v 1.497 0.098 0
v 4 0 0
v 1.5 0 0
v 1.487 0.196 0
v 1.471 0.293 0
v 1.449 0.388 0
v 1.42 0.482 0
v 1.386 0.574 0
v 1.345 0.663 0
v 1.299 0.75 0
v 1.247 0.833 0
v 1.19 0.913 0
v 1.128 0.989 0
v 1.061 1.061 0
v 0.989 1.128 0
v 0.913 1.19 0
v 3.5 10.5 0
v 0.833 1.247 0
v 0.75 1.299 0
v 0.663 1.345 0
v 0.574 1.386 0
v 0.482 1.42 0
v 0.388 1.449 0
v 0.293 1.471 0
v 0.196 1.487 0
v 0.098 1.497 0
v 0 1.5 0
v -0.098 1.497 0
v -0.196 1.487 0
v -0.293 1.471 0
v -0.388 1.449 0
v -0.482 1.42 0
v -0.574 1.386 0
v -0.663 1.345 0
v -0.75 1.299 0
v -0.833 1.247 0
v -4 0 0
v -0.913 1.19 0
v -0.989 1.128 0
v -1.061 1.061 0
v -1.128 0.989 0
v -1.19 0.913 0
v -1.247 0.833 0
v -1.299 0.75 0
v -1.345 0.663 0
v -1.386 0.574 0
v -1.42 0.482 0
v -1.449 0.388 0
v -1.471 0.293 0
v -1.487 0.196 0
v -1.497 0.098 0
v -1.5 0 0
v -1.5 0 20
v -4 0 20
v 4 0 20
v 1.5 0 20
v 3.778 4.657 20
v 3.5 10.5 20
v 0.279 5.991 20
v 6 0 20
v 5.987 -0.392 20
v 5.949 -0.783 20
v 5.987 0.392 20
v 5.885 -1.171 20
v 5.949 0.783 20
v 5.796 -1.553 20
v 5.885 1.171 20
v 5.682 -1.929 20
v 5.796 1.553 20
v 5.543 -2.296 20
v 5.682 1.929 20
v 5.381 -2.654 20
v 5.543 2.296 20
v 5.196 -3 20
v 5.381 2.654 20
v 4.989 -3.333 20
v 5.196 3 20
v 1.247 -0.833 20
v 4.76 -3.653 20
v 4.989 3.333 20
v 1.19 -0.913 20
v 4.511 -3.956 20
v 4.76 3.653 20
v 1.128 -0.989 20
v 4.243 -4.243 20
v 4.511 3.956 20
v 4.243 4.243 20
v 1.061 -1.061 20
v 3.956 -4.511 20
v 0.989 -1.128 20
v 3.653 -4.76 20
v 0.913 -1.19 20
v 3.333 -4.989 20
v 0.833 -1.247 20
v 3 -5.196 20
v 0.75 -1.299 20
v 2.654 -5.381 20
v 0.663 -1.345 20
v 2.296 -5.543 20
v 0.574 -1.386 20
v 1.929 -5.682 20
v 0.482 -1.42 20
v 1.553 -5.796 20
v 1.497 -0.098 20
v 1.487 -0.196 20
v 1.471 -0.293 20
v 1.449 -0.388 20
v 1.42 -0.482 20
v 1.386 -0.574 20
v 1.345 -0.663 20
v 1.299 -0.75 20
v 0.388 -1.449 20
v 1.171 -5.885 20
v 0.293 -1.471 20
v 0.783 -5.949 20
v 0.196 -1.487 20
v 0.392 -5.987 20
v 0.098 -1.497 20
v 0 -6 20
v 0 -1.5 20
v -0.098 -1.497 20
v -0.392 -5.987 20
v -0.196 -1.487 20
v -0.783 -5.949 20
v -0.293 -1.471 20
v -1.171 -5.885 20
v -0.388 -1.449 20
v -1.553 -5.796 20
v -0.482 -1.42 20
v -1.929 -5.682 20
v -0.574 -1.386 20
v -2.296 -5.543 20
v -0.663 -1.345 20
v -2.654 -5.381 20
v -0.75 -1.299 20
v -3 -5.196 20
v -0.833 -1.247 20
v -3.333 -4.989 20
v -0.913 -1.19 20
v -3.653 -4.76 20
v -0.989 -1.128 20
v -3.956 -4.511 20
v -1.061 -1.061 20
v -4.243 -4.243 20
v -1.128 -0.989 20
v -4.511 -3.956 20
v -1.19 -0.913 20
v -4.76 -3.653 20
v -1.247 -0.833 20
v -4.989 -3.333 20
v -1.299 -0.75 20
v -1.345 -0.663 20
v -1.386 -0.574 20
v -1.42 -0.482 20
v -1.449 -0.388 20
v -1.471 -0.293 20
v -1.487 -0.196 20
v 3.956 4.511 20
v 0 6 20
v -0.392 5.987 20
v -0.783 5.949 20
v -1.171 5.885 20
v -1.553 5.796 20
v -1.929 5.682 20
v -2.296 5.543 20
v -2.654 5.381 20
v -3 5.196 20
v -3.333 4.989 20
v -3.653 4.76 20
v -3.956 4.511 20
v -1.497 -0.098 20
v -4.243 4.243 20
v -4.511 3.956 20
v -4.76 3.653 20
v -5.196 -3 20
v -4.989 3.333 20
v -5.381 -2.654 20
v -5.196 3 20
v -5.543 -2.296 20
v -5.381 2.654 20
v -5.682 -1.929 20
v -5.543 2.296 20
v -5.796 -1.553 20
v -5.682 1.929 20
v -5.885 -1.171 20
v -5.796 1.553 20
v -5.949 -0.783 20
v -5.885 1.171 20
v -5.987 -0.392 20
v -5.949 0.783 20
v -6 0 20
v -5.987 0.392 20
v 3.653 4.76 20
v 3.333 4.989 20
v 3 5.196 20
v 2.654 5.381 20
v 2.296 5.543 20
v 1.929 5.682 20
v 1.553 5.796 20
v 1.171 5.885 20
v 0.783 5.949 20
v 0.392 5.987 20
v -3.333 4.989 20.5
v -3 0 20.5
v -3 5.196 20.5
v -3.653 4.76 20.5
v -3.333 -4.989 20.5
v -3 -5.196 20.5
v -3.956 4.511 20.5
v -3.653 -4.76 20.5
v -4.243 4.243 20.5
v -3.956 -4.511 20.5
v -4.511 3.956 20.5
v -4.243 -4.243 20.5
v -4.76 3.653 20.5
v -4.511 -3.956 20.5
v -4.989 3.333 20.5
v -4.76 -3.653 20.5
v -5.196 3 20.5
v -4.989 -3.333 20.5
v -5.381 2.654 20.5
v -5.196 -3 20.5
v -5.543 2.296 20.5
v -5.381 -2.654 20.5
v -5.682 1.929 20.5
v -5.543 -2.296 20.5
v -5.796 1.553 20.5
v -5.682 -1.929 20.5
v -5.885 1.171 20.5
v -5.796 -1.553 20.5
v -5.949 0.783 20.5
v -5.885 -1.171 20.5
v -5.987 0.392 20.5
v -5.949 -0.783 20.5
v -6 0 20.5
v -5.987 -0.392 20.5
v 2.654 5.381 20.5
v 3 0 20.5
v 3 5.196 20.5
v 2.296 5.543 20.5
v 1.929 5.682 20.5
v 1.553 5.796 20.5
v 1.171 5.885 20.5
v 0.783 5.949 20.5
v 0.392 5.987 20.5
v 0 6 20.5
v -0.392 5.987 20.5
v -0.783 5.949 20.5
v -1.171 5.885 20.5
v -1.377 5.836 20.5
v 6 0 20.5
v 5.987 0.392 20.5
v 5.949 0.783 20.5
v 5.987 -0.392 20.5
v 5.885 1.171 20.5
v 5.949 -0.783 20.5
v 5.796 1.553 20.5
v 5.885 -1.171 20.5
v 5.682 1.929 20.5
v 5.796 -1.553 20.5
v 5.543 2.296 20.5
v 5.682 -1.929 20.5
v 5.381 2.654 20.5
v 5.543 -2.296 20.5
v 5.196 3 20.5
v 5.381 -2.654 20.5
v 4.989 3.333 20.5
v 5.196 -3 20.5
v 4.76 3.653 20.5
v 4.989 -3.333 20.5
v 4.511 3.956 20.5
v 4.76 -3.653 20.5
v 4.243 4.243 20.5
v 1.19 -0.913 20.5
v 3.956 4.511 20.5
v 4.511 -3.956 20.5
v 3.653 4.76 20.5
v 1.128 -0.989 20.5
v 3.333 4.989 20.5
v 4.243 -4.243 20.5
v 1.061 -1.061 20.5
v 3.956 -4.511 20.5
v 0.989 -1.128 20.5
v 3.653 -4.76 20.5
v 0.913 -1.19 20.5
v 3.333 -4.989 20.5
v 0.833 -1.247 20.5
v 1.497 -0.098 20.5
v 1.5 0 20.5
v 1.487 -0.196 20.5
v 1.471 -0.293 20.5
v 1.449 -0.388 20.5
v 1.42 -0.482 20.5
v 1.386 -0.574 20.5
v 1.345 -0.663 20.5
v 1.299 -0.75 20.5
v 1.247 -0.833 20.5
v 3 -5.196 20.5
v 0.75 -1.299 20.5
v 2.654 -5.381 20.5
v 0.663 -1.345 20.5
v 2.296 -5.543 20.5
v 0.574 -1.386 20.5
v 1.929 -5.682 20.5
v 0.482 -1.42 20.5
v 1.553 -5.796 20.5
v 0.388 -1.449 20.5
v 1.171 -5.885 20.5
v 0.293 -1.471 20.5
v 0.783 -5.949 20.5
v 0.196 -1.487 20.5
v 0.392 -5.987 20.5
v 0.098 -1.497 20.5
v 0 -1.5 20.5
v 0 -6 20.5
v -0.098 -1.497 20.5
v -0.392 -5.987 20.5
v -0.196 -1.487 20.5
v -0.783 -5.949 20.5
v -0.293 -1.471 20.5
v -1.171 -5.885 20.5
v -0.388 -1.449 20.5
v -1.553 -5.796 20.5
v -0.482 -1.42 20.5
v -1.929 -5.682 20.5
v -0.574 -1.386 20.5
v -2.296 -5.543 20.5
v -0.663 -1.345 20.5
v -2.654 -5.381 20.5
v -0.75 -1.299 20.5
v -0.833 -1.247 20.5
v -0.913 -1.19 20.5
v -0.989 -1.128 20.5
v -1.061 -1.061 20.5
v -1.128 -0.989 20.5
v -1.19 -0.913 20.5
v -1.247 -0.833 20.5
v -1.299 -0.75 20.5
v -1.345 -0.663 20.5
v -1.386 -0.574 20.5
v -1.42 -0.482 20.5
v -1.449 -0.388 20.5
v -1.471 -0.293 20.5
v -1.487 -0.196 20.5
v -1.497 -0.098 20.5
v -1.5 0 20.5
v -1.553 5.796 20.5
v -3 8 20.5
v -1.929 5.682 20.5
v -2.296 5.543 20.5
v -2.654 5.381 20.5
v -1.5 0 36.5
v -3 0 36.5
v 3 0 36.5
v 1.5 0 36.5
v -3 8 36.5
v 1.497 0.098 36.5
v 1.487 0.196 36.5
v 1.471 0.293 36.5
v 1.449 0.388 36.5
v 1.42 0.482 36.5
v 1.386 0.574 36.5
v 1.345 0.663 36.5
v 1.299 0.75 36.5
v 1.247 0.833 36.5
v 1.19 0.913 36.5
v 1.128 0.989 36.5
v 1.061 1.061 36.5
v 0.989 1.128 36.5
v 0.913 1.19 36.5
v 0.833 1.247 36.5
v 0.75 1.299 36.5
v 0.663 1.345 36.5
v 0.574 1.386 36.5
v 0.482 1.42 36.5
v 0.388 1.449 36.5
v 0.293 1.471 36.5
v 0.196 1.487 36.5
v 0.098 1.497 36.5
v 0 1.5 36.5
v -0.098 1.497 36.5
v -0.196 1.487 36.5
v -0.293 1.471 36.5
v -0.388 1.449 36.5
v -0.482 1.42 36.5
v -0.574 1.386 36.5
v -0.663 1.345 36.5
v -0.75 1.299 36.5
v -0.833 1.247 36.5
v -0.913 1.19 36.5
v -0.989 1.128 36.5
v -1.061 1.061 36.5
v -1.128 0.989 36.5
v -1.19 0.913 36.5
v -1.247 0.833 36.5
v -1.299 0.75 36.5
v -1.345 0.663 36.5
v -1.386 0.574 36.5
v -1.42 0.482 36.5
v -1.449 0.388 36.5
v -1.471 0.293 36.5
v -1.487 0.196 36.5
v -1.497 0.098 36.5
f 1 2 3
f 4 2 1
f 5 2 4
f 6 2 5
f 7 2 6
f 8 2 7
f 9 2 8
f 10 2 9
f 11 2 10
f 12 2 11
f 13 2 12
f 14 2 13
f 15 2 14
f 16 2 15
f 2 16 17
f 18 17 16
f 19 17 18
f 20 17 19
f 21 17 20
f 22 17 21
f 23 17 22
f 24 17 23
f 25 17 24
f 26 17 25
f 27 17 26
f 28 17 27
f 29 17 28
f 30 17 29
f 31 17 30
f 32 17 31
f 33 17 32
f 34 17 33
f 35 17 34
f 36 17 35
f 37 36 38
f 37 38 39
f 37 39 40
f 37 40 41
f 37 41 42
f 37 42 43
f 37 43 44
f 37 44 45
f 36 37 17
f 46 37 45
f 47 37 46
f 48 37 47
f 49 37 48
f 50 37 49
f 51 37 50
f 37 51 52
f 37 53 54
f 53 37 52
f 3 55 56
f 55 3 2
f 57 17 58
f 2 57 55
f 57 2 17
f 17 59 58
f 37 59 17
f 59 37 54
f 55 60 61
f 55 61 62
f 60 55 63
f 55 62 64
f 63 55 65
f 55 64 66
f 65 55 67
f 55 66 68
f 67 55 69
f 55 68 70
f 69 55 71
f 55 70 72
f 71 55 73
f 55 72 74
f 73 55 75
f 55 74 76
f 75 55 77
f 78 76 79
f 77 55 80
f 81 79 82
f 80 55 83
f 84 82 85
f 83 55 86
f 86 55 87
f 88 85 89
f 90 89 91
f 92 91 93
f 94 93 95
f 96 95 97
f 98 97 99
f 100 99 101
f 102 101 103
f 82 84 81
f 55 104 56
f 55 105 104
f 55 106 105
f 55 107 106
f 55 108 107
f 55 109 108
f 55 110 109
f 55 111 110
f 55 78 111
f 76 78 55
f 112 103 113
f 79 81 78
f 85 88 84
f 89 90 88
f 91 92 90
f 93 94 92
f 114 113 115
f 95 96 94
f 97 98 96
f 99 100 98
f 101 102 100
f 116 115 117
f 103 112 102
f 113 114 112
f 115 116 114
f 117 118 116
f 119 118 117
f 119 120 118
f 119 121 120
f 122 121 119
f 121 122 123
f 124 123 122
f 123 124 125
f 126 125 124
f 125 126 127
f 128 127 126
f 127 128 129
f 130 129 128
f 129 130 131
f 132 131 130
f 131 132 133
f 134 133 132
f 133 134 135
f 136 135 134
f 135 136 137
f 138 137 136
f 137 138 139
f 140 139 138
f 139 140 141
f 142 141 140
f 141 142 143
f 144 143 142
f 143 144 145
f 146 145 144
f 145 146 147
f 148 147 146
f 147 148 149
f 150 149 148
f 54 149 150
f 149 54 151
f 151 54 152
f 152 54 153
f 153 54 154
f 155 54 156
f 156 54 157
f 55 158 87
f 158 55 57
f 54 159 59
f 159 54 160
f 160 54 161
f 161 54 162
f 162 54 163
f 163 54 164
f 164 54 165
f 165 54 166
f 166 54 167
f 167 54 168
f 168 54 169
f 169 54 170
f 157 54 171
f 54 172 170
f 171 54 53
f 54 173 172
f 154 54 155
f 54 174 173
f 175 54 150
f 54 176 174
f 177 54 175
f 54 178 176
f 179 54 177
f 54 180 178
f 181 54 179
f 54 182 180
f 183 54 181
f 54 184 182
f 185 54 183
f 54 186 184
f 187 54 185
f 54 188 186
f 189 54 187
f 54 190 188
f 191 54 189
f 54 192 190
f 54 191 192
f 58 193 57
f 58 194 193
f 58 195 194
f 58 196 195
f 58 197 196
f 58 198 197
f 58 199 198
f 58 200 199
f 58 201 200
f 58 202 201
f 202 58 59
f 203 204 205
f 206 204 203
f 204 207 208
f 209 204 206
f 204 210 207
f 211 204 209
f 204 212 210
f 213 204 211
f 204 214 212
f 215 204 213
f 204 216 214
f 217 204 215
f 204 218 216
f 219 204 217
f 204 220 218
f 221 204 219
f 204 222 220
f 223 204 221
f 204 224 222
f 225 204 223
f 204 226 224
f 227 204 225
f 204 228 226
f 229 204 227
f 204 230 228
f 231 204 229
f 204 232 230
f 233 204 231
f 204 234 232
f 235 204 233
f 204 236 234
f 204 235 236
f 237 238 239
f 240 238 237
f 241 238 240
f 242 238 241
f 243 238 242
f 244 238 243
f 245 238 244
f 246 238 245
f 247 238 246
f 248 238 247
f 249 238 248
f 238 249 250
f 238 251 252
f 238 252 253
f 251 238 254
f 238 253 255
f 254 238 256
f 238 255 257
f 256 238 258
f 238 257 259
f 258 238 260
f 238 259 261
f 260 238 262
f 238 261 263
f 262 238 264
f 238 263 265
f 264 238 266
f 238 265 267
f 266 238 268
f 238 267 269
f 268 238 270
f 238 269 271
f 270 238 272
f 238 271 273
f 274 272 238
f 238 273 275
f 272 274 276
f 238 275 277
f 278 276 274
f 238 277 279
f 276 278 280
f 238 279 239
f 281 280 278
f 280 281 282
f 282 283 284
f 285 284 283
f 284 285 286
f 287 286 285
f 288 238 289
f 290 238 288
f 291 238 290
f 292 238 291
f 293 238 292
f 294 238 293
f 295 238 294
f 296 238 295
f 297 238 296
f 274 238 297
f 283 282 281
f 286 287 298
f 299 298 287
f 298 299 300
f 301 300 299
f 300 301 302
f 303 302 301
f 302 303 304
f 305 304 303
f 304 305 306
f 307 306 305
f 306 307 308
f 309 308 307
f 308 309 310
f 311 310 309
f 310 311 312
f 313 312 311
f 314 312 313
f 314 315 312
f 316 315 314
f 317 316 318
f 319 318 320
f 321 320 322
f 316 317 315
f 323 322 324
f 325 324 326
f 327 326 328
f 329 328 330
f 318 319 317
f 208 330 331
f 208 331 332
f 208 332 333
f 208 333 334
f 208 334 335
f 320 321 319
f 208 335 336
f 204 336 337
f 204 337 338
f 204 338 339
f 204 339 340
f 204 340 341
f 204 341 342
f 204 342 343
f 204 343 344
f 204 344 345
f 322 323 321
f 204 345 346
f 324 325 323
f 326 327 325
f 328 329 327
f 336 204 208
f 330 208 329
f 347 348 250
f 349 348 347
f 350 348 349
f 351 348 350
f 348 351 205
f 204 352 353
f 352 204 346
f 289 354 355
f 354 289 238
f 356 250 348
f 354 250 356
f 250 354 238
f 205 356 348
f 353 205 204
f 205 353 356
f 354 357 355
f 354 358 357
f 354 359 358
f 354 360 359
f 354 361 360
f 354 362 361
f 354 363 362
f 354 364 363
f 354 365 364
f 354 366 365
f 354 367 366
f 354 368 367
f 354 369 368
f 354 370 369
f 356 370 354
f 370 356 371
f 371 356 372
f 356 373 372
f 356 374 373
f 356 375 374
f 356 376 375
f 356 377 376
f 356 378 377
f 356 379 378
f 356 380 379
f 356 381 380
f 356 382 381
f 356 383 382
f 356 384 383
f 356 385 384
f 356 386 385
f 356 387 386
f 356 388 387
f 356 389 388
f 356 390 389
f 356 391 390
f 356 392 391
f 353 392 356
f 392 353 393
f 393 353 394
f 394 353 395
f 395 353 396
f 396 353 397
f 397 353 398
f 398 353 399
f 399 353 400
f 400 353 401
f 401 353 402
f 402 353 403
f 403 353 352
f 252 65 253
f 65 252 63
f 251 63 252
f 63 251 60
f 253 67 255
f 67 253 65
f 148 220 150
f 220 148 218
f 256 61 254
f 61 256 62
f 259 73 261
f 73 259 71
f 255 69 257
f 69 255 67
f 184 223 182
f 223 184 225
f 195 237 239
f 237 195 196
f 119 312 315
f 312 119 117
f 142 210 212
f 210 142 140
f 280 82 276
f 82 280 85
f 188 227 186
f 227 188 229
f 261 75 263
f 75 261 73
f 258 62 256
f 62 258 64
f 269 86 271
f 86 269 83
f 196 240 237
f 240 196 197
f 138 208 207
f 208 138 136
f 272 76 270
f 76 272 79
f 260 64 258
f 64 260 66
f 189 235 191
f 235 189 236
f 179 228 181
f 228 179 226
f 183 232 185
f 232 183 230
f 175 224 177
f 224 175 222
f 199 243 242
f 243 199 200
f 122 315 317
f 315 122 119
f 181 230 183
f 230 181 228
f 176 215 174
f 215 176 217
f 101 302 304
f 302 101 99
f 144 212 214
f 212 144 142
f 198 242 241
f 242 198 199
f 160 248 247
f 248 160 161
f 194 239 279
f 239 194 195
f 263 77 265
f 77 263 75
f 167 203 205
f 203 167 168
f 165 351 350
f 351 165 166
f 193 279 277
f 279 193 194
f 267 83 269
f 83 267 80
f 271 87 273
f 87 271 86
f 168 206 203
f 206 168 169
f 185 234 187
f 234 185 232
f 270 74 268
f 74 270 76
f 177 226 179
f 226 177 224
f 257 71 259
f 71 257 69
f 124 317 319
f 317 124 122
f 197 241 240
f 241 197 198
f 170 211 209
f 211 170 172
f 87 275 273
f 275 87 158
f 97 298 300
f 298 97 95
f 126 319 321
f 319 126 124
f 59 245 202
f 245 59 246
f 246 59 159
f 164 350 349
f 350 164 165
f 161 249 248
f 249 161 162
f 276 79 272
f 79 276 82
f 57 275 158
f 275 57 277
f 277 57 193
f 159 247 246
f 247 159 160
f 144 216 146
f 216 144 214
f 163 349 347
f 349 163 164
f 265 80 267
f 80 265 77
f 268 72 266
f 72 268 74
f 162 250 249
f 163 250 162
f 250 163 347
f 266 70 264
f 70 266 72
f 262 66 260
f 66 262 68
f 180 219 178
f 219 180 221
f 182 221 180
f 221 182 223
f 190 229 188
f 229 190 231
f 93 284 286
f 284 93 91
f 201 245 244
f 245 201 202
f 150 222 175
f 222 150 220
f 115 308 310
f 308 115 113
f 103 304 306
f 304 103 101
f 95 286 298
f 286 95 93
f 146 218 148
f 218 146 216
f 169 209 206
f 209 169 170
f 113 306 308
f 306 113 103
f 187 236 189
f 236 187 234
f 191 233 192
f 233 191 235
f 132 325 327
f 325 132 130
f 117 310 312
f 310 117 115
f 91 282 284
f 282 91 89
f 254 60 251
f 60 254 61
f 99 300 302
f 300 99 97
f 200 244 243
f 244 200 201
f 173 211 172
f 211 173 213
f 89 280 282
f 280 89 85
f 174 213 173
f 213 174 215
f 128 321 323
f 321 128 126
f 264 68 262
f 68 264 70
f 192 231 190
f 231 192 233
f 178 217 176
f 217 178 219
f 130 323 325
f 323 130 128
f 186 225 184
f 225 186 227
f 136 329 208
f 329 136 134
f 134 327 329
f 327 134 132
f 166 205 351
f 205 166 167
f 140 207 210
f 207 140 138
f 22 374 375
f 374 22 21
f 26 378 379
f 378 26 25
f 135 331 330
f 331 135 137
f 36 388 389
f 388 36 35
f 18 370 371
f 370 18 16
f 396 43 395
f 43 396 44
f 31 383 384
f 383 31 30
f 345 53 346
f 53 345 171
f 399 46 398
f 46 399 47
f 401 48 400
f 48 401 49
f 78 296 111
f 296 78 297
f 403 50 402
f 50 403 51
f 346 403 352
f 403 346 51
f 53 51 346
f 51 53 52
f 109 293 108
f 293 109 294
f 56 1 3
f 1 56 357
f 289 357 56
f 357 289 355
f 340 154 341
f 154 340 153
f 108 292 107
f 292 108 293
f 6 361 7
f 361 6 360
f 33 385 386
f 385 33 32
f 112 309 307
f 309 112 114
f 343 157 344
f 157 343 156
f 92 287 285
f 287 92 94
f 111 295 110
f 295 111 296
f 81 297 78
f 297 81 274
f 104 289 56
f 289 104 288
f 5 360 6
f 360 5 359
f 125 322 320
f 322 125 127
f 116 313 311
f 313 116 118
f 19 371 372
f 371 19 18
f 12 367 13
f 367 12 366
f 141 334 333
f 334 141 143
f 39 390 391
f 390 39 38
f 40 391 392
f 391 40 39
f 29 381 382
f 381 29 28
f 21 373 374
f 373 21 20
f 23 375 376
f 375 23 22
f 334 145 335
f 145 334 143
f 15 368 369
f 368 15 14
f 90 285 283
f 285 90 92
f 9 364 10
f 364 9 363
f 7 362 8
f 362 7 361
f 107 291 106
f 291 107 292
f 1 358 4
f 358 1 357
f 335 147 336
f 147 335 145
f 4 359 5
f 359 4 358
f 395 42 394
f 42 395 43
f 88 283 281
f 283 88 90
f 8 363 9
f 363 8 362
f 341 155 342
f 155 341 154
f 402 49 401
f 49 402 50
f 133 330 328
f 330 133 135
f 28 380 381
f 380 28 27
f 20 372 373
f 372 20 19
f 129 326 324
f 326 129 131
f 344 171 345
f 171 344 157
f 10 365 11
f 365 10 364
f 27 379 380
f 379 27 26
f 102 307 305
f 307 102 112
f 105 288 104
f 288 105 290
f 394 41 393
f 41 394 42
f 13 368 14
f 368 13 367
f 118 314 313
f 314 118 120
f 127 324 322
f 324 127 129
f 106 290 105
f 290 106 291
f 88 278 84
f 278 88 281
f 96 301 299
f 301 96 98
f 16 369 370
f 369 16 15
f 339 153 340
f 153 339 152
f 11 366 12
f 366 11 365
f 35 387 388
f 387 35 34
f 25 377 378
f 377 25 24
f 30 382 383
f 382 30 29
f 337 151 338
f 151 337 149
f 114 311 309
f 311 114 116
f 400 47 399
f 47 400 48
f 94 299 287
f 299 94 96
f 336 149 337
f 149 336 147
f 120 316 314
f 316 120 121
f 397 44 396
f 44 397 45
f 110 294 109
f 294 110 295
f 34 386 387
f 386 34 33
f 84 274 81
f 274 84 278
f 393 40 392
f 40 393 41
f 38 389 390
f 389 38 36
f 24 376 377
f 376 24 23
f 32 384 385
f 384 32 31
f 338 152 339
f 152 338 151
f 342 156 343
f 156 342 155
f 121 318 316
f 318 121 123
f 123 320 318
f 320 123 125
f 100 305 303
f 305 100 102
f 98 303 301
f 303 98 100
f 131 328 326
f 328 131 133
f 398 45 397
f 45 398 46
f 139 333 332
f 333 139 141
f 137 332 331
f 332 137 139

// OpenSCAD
// Straight hose-barb reducer: 8 mm tubing (z = 0..20) -> 5 mm tubing (z = 25..41)
// Print orientation: standing upright along +Z, centred on the origin in X/Y.
// Units: mm. Bore: 3 mm through the full length.

// ---------------- Parameters ----------------
reducer_in_d     = 8;    // inlet tubing inner diameter
reducer_out_d    = 5;    // outlet tubing inner diameter
reducer_bore_d   = 3;    // through-bore diameter
reducer_barb_n   = 2;    // number of barbs per end (stacked)
reducer_len_in   = 20;   // inlet section length (z = 0..20)
reducer_len_out  = 16;   // outlet section length (z = 25..41)
reducer_collar_d = 12;   // intermediate collar diameter (z = 20..25)
reducer_overlap  = 0.5;  // overlap/step depth so adjacent shapes fuse cleanly

$fn = 96;                // curve resolution

// ---------------- Derived ----------------
in_r      = reducer_in_d / 2;      // 4.0
out_r     = reducer_out_d / 2;     // 2.5
collar_r  = reducer_collar_d / 2;  // 6.0
total_h   = reducer_len_in + reducer_len_out + reducer_overlap;  // 41.5 (extends past the last face)

// ---------------- Model ----------------
difference() {
    union() {
        // Inlet barbs with sawtooth profile (z = 0..20)
        for (i = [0 : reducer_barb_n - 1]) {
            translate([0, 0, i * reducer_len_in / reducer_barb_n])
                linear_extrude(height = reducer_len_in / reducer_barb_n)
                    polygon([
                        [-in_r, 0],
                        [ in_r, 0],
                        [ (in_r - reducer_overlap),
                          reducer_len_in / reducer_barb_n + reducer_overlap ]
                    ]);
        }

        // Outlet barbs with shrinking profile (z = 25..41)
        for (i = [0 : reducer_barb_n - 1]) {
            translate([0, 0, reducer_len_in + reducer_overlap + i * reducer_len_out / reducer_barb_n])
                linear_extrude(height = reducer_len_out / reducer_barb_n)
                    polygon([
                        [out_r + reducer_overlap, 0],
                        [-out_r - reducer_overlap, 0],
                        [ -out_r - reducer_overlap,
                          reducer_len_out / reducer_barb_n ]
                    ]);
        }

        // Collar (z = 20..25)
        translate([0, 0, reducer_len_in])
            cylinder(h = reducer_overlap, r = collar_r);
    }

    // Through-bore (extends past both end faces)
    translate([0, 0, -1])
        cylinder(h = total_h + 2, d = reducer_bore_d);
}
